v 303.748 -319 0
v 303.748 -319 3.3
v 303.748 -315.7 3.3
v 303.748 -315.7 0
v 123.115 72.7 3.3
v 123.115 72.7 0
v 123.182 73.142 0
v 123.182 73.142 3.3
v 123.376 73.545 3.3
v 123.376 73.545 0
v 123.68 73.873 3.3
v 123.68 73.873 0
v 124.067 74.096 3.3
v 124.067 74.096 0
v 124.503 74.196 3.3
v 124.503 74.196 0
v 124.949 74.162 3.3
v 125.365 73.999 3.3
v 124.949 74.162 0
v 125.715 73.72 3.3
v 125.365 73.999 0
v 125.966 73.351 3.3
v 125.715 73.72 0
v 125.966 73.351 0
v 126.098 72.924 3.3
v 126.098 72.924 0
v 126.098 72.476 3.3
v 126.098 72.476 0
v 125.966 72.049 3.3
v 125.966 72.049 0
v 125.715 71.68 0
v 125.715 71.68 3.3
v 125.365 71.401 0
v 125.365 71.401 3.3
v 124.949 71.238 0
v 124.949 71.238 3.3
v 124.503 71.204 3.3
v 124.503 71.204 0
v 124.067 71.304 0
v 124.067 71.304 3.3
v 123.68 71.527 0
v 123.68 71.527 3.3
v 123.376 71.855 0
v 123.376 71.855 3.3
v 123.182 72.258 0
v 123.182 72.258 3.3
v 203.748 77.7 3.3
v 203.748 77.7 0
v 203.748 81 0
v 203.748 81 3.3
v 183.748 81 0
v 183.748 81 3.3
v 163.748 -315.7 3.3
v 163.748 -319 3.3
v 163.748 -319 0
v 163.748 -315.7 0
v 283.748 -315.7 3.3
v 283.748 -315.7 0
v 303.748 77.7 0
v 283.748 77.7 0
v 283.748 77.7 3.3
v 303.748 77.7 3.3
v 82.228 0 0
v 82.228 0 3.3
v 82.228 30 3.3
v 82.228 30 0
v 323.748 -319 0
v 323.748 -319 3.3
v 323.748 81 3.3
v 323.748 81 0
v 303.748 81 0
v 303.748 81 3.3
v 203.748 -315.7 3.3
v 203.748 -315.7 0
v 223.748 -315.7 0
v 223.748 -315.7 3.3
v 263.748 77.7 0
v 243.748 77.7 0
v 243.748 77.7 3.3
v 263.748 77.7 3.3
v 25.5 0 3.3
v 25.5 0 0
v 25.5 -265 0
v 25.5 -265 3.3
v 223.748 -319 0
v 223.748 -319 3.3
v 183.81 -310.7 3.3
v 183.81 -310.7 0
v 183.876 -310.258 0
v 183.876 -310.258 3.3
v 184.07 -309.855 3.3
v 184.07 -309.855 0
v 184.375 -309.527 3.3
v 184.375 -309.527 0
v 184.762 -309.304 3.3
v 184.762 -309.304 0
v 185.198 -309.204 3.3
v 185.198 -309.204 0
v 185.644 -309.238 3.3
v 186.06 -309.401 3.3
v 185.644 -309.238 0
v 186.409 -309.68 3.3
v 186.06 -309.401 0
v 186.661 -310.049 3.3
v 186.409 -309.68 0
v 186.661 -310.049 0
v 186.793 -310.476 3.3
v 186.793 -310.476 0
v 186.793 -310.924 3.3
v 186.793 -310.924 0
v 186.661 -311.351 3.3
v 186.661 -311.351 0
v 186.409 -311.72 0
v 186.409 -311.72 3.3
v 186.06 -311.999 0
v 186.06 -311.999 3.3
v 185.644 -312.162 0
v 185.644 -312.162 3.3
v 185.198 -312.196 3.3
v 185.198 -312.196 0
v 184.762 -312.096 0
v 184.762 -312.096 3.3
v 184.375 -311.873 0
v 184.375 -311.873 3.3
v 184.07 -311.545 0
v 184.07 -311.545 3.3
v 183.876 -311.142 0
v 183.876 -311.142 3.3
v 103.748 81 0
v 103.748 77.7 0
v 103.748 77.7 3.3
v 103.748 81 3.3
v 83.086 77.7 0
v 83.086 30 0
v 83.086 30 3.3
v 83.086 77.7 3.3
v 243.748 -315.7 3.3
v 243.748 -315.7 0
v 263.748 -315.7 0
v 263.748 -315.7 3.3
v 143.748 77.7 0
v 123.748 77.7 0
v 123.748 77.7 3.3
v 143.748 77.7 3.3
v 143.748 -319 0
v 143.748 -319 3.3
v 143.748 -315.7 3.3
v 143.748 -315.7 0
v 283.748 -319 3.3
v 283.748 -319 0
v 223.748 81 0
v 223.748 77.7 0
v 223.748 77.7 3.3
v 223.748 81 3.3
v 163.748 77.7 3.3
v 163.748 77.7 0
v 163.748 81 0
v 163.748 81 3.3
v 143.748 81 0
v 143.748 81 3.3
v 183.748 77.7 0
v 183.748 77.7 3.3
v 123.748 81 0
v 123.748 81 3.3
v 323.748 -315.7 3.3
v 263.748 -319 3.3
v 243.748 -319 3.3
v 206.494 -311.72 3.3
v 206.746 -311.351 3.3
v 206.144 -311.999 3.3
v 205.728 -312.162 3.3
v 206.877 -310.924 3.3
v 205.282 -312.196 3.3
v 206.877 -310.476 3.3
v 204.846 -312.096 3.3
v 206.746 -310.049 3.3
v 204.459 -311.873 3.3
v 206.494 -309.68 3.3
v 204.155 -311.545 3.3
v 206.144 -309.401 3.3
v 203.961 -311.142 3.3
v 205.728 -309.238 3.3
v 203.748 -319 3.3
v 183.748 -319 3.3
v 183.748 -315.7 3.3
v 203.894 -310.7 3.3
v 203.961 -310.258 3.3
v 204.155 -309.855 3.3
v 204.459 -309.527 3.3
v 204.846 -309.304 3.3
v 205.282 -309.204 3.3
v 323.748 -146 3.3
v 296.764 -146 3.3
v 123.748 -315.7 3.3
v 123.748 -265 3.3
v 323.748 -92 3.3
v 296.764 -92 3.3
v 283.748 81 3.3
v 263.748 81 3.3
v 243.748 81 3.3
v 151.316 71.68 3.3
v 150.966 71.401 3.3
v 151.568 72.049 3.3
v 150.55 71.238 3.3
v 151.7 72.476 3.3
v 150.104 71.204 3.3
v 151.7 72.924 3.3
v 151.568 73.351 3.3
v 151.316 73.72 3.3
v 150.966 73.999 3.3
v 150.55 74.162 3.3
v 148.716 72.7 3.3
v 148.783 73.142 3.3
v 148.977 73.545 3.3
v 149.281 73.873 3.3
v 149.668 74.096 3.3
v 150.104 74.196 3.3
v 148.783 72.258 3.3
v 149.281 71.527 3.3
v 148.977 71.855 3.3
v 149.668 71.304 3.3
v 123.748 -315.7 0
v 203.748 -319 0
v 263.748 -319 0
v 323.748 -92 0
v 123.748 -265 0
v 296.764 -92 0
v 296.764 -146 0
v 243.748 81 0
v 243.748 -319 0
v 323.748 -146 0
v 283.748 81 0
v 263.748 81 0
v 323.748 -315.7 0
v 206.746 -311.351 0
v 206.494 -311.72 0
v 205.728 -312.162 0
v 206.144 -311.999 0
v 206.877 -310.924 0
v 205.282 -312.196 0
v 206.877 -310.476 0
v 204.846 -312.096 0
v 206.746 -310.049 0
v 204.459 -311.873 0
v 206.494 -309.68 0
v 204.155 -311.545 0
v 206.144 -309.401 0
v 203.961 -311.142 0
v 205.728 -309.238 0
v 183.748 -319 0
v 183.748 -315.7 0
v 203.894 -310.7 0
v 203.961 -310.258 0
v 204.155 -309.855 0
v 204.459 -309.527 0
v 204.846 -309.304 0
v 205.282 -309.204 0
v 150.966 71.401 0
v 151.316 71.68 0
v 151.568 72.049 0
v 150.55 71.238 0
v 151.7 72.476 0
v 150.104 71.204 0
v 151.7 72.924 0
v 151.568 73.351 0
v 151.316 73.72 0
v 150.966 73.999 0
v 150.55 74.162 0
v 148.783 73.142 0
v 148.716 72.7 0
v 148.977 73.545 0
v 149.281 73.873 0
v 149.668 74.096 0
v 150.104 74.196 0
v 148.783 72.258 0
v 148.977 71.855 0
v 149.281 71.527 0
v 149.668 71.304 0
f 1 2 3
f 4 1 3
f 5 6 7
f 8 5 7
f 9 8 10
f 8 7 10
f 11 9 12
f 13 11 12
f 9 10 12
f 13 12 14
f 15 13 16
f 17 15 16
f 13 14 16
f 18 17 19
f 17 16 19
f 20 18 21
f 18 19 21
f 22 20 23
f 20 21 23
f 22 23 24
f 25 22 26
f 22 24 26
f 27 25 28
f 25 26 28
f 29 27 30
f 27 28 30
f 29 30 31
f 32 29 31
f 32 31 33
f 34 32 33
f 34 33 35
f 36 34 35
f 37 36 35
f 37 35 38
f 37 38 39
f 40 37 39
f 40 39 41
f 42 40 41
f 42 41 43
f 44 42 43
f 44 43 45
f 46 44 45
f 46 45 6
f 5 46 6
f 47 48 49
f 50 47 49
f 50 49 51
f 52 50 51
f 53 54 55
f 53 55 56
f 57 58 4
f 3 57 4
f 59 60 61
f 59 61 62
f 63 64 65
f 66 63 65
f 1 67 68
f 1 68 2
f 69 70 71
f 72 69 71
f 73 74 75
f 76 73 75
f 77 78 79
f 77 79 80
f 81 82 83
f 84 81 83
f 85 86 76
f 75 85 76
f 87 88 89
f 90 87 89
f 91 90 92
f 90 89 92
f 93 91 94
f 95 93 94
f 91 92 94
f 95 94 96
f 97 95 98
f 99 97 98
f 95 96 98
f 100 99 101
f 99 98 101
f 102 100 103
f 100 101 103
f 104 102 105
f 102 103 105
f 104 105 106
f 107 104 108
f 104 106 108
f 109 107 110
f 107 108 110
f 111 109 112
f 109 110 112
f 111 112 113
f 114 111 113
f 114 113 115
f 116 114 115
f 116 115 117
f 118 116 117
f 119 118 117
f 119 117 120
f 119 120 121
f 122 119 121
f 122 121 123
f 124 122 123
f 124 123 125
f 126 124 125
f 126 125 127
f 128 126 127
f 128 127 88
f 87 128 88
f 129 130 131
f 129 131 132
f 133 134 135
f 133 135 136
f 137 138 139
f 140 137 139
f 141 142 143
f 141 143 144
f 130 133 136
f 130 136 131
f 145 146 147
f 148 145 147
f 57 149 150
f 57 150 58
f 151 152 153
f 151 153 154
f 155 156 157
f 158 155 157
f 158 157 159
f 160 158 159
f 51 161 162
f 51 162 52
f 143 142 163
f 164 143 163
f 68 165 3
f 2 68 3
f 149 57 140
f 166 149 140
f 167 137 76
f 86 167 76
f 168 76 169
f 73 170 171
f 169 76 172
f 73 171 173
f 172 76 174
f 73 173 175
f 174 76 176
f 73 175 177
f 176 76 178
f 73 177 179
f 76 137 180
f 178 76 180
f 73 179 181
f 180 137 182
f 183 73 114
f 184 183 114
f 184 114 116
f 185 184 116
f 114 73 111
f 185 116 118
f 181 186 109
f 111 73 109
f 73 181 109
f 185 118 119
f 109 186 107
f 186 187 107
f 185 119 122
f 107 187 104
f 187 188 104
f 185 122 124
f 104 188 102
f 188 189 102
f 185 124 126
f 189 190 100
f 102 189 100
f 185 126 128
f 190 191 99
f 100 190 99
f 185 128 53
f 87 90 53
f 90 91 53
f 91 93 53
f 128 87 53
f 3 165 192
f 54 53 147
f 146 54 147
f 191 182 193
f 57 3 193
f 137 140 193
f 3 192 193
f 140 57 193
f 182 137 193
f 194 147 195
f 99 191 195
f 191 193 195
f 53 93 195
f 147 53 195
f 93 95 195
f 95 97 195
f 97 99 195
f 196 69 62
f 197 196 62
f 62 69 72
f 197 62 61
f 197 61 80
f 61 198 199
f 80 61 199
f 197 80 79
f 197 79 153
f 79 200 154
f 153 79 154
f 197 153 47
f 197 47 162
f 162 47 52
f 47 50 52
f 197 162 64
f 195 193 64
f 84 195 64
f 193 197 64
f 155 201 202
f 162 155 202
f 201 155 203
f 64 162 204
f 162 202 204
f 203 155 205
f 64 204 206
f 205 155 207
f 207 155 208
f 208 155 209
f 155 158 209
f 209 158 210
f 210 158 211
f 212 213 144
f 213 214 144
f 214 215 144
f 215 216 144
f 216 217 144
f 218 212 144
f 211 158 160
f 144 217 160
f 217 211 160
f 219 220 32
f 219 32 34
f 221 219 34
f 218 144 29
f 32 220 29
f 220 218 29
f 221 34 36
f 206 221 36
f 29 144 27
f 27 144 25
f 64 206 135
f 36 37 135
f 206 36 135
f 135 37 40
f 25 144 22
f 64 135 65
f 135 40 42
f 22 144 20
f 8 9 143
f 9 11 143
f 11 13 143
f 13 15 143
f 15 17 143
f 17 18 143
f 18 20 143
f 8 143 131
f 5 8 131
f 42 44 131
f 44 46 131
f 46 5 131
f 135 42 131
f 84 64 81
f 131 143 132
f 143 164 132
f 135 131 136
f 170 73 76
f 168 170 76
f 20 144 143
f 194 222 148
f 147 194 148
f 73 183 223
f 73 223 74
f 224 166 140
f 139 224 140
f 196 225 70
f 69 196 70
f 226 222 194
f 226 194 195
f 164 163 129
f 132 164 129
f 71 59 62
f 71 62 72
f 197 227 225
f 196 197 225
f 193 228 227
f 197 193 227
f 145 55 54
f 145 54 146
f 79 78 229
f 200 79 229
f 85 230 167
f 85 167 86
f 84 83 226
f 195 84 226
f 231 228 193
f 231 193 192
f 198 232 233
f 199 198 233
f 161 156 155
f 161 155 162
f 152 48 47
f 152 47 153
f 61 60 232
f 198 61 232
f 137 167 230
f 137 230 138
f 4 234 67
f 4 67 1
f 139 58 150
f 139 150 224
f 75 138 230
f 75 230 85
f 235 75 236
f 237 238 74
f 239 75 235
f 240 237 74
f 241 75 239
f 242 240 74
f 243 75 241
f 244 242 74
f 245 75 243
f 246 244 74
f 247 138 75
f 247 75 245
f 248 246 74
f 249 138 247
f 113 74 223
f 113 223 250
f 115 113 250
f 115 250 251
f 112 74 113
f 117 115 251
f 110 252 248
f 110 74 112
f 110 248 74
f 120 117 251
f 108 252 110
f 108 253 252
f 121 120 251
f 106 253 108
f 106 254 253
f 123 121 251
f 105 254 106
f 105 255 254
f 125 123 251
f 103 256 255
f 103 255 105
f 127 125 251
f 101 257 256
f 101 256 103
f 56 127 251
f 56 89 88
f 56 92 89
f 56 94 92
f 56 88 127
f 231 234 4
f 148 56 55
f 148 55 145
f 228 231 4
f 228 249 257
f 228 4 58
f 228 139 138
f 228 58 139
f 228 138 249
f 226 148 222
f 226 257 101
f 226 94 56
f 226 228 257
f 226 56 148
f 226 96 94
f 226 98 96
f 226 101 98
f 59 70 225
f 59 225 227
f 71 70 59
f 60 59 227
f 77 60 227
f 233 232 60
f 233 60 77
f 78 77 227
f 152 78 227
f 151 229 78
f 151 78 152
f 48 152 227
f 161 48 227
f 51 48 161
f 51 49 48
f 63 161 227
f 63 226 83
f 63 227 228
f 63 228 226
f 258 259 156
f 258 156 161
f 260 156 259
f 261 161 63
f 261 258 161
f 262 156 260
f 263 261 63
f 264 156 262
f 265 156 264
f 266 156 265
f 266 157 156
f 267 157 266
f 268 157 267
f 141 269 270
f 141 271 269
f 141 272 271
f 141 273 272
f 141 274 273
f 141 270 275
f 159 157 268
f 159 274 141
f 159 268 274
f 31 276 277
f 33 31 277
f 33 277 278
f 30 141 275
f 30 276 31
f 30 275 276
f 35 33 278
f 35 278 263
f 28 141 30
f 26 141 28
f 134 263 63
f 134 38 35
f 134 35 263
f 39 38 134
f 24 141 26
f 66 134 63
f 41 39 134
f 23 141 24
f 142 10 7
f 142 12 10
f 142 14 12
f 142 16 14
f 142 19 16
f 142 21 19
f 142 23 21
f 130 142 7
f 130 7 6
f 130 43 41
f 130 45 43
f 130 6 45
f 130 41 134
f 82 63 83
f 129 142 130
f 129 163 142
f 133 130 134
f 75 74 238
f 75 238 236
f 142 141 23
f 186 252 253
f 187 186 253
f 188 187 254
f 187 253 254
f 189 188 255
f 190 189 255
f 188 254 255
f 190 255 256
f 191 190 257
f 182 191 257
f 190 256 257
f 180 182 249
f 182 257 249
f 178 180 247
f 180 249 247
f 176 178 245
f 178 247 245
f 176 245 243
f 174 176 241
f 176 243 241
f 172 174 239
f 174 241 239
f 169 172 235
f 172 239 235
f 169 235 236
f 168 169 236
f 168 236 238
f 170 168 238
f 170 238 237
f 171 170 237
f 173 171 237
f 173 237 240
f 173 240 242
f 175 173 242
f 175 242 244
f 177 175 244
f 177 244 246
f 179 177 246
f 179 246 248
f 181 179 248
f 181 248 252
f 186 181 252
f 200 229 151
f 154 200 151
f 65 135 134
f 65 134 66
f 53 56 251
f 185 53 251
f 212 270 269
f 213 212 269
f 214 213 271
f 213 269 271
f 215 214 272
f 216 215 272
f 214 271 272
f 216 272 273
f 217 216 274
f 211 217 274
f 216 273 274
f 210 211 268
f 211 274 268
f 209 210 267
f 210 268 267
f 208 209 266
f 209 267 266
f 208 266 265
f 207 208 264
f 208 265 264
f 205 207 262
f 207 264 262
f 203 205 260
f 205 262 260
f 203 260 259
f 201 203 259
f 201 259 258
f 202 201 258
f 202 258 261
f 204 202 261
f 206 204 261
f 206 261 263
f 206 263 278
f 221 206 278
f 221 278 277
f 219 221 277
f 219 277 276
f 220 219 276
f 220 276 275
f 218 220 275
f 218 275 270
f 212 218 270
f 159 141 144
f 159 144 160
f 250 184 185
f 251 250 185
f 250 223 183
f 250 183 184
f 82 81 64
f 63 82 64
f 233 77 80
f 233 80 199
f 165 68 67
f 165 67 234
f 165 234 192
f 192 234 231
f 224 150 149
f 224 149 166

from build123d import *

# Parameters (mm, degrees)
SKETCH1_W               = 200
SKETCH1_H               = 50.7
SKETCH1_W_2             = 240.661854396
SKETCH1_H_2             = 47.7
BOSS_EXTRUDE1_DEPTH     = 3.3
SKETCH2_R               = 1.5
CUT_EXTRUDE1_DEPTH      = 453.205952877
CUT_EXTRUDE2_DEPTH      = 455.953272433
CUT_EXTRUDE2_DEPTH_BACK = 455.953272433
SKETCH3_W               = 24.5
SKETCH3_H               = 54
SKETCH4_W               = 26.984189883
SKETCH4_H               = 54
CUT_EXTRUDE3_DEPTH      = 10
SKETCH6_W               = 56.727923661
SKETCH6_H               = 30
CUT_EXTRUDE4_DEPTH      = 10
SKETCH7_W               = 20
SKETCH7_H               = 3.3
BOSS_EXTRUDE2_DEPTH     = 3.3


with BuildPart() as part:
    # Sketch1 → Boss-Extrude1 (new body)
    with BuildSketch(Plane.XY):
        Polygon((25.5, 1), (25.5, -13), (25.5, -225), (25.5, -265), (65.632913627, -265), (123.748117859, -265), (323.748117859, -265), (323.748117859, 30), (83.086263463, 30), (25.5, 30), align=None)
        with Locations((223.748117859, -290.35)):
            Rectangle(SKETCH1_W, SKETCH1_H)
        with Locations((203.417190661, 53.85)):
            Rectangle(SKETCH1_W_2, SKETCH1_H_2)
    extrude(amount=BOSS_EXTRUDE1_DEPTH)

    # Sketch2 → Cut-Extrude1 (cut, through all)
    with BuildSketch(Plane(origin=(0, 0, 0), x_dir=(-1, 0, 0), z_dir=(0, 0, -1))):
        with Locations((-150.216261358, 72.7)):
            Circle(SKETCH2_R)
        with Locations((-124.61492379, 72.7)):
            Circle(SKETCH2_R)
        with Locations((-205.394208158, -310.7)):
            Circle(SKETCH2_R)
        with Locations((-185.309760184, -310.7)):
            Circle(SKETCH2_R)
    extrude(amount=-CUT_EXTRUDE1_DEPTH, mode=Mode.SUBTRACT)

    # Sketch3 → Cut-Extrude2 (cut, two sides: drawn at the far end of the back side and taken through both)
    with BuildSketch(Plane(origin=(119.391473557, 0, 256.035841294), x_dir=(0.9063077870366519, 0, -0.42261826174069517), z_dir=(0.42261826174069517, 0, 0.9063077870366519)).offset(-CUT_EXTRUDE2_DEPTH_BACK)):
        with Locations((281.209458836, -119)):
            Rectangle(SKETCH3_W, SKETCH3_H)
    extrude(amount=CUT_EXTRUDE2_DEPTH + CUT_EXTRUDE2_DEPTH_BACK, mode=Mode.SUBTRACT)

    # Sketch4 → Cut-Extrude3 (cut)
    with BuildSketch(Plane(origin=(0, 0, 0), x_dir=(-1, 0, 0), z_dir=(0, 0, -1))):
        with Locations((-310.256022917, -119)):
            Rectangle(SKETCH4_W, SKETCH4_H)
    extrude(amount=-CUT_EXTRUDE3_DEPTH, mode=Mode.SUBTRACT)

    # Sketch6 → Cut-Extrude4 (cut)
    with BuildSketch(Plane.XY.offset(3.3)):
        with Locations((53.863961831, 15)):
            Rectangle(SKETCH6_W, SKETCH6_H)
    extrude(amount=-CUT_EXTRUDE4_DEPTH, mode=Mode.SUBTRACT)

    # Sketch7 → Boss-Extrude2 (add)
    with BuildSketch(Plane(origin=(0, 0, 0), x_dir=(-1, 0, 0), z_dir=(0, 0, -1))):
        with Locations((-193.748117858, -317.35)):
            Rectangle(SKETCH7_W, SKETCH7_H)
        with Locations((-153.748117858, -317.35)):
            Rectangle(SKETCH7_W, SKETCH7_H)
        with Locations((-113.748117859, 79.35)):
            Rectangle(SKETCH7_W, SKETCH7_H)
        with Locations((-153.748117859, 79.35)):
            Rectangle(SKETCH7_W, SKETCH7_H)
        with Locations((-233.748117858, -317.35)):
            Rectangle(SKETCH7_W, SKETCH7_H)
        with Locations((-193.748117859, 79.35)):
            Rectangle(SKETCH7_W, SKETCH7_H)
        with Locations((-273.748117858, -317.35)):
            Rectangle(SKETCH7_W, SKETCH7_H)
        with Locations((-233.748117859, 79.35)):
            Rectangle(SKETCH7_W, SKETCH7_H)
        with Locations((-313.748117858, -317.35)):
            Rectangle(SKETCH7_W, SKETCH7_H)
        with Locations((-273.748117859, 79.35)):
            Rectangle(SKETCH7_W, SKETCH7_H)
        with Locations((-313.748117859, 79.35)):
            Rectangle(SKETCH7_W, SKETCH7_H)
    extrude(amount=-BOSS_EXTRUDE2_DEPTH)


solid = part.part
